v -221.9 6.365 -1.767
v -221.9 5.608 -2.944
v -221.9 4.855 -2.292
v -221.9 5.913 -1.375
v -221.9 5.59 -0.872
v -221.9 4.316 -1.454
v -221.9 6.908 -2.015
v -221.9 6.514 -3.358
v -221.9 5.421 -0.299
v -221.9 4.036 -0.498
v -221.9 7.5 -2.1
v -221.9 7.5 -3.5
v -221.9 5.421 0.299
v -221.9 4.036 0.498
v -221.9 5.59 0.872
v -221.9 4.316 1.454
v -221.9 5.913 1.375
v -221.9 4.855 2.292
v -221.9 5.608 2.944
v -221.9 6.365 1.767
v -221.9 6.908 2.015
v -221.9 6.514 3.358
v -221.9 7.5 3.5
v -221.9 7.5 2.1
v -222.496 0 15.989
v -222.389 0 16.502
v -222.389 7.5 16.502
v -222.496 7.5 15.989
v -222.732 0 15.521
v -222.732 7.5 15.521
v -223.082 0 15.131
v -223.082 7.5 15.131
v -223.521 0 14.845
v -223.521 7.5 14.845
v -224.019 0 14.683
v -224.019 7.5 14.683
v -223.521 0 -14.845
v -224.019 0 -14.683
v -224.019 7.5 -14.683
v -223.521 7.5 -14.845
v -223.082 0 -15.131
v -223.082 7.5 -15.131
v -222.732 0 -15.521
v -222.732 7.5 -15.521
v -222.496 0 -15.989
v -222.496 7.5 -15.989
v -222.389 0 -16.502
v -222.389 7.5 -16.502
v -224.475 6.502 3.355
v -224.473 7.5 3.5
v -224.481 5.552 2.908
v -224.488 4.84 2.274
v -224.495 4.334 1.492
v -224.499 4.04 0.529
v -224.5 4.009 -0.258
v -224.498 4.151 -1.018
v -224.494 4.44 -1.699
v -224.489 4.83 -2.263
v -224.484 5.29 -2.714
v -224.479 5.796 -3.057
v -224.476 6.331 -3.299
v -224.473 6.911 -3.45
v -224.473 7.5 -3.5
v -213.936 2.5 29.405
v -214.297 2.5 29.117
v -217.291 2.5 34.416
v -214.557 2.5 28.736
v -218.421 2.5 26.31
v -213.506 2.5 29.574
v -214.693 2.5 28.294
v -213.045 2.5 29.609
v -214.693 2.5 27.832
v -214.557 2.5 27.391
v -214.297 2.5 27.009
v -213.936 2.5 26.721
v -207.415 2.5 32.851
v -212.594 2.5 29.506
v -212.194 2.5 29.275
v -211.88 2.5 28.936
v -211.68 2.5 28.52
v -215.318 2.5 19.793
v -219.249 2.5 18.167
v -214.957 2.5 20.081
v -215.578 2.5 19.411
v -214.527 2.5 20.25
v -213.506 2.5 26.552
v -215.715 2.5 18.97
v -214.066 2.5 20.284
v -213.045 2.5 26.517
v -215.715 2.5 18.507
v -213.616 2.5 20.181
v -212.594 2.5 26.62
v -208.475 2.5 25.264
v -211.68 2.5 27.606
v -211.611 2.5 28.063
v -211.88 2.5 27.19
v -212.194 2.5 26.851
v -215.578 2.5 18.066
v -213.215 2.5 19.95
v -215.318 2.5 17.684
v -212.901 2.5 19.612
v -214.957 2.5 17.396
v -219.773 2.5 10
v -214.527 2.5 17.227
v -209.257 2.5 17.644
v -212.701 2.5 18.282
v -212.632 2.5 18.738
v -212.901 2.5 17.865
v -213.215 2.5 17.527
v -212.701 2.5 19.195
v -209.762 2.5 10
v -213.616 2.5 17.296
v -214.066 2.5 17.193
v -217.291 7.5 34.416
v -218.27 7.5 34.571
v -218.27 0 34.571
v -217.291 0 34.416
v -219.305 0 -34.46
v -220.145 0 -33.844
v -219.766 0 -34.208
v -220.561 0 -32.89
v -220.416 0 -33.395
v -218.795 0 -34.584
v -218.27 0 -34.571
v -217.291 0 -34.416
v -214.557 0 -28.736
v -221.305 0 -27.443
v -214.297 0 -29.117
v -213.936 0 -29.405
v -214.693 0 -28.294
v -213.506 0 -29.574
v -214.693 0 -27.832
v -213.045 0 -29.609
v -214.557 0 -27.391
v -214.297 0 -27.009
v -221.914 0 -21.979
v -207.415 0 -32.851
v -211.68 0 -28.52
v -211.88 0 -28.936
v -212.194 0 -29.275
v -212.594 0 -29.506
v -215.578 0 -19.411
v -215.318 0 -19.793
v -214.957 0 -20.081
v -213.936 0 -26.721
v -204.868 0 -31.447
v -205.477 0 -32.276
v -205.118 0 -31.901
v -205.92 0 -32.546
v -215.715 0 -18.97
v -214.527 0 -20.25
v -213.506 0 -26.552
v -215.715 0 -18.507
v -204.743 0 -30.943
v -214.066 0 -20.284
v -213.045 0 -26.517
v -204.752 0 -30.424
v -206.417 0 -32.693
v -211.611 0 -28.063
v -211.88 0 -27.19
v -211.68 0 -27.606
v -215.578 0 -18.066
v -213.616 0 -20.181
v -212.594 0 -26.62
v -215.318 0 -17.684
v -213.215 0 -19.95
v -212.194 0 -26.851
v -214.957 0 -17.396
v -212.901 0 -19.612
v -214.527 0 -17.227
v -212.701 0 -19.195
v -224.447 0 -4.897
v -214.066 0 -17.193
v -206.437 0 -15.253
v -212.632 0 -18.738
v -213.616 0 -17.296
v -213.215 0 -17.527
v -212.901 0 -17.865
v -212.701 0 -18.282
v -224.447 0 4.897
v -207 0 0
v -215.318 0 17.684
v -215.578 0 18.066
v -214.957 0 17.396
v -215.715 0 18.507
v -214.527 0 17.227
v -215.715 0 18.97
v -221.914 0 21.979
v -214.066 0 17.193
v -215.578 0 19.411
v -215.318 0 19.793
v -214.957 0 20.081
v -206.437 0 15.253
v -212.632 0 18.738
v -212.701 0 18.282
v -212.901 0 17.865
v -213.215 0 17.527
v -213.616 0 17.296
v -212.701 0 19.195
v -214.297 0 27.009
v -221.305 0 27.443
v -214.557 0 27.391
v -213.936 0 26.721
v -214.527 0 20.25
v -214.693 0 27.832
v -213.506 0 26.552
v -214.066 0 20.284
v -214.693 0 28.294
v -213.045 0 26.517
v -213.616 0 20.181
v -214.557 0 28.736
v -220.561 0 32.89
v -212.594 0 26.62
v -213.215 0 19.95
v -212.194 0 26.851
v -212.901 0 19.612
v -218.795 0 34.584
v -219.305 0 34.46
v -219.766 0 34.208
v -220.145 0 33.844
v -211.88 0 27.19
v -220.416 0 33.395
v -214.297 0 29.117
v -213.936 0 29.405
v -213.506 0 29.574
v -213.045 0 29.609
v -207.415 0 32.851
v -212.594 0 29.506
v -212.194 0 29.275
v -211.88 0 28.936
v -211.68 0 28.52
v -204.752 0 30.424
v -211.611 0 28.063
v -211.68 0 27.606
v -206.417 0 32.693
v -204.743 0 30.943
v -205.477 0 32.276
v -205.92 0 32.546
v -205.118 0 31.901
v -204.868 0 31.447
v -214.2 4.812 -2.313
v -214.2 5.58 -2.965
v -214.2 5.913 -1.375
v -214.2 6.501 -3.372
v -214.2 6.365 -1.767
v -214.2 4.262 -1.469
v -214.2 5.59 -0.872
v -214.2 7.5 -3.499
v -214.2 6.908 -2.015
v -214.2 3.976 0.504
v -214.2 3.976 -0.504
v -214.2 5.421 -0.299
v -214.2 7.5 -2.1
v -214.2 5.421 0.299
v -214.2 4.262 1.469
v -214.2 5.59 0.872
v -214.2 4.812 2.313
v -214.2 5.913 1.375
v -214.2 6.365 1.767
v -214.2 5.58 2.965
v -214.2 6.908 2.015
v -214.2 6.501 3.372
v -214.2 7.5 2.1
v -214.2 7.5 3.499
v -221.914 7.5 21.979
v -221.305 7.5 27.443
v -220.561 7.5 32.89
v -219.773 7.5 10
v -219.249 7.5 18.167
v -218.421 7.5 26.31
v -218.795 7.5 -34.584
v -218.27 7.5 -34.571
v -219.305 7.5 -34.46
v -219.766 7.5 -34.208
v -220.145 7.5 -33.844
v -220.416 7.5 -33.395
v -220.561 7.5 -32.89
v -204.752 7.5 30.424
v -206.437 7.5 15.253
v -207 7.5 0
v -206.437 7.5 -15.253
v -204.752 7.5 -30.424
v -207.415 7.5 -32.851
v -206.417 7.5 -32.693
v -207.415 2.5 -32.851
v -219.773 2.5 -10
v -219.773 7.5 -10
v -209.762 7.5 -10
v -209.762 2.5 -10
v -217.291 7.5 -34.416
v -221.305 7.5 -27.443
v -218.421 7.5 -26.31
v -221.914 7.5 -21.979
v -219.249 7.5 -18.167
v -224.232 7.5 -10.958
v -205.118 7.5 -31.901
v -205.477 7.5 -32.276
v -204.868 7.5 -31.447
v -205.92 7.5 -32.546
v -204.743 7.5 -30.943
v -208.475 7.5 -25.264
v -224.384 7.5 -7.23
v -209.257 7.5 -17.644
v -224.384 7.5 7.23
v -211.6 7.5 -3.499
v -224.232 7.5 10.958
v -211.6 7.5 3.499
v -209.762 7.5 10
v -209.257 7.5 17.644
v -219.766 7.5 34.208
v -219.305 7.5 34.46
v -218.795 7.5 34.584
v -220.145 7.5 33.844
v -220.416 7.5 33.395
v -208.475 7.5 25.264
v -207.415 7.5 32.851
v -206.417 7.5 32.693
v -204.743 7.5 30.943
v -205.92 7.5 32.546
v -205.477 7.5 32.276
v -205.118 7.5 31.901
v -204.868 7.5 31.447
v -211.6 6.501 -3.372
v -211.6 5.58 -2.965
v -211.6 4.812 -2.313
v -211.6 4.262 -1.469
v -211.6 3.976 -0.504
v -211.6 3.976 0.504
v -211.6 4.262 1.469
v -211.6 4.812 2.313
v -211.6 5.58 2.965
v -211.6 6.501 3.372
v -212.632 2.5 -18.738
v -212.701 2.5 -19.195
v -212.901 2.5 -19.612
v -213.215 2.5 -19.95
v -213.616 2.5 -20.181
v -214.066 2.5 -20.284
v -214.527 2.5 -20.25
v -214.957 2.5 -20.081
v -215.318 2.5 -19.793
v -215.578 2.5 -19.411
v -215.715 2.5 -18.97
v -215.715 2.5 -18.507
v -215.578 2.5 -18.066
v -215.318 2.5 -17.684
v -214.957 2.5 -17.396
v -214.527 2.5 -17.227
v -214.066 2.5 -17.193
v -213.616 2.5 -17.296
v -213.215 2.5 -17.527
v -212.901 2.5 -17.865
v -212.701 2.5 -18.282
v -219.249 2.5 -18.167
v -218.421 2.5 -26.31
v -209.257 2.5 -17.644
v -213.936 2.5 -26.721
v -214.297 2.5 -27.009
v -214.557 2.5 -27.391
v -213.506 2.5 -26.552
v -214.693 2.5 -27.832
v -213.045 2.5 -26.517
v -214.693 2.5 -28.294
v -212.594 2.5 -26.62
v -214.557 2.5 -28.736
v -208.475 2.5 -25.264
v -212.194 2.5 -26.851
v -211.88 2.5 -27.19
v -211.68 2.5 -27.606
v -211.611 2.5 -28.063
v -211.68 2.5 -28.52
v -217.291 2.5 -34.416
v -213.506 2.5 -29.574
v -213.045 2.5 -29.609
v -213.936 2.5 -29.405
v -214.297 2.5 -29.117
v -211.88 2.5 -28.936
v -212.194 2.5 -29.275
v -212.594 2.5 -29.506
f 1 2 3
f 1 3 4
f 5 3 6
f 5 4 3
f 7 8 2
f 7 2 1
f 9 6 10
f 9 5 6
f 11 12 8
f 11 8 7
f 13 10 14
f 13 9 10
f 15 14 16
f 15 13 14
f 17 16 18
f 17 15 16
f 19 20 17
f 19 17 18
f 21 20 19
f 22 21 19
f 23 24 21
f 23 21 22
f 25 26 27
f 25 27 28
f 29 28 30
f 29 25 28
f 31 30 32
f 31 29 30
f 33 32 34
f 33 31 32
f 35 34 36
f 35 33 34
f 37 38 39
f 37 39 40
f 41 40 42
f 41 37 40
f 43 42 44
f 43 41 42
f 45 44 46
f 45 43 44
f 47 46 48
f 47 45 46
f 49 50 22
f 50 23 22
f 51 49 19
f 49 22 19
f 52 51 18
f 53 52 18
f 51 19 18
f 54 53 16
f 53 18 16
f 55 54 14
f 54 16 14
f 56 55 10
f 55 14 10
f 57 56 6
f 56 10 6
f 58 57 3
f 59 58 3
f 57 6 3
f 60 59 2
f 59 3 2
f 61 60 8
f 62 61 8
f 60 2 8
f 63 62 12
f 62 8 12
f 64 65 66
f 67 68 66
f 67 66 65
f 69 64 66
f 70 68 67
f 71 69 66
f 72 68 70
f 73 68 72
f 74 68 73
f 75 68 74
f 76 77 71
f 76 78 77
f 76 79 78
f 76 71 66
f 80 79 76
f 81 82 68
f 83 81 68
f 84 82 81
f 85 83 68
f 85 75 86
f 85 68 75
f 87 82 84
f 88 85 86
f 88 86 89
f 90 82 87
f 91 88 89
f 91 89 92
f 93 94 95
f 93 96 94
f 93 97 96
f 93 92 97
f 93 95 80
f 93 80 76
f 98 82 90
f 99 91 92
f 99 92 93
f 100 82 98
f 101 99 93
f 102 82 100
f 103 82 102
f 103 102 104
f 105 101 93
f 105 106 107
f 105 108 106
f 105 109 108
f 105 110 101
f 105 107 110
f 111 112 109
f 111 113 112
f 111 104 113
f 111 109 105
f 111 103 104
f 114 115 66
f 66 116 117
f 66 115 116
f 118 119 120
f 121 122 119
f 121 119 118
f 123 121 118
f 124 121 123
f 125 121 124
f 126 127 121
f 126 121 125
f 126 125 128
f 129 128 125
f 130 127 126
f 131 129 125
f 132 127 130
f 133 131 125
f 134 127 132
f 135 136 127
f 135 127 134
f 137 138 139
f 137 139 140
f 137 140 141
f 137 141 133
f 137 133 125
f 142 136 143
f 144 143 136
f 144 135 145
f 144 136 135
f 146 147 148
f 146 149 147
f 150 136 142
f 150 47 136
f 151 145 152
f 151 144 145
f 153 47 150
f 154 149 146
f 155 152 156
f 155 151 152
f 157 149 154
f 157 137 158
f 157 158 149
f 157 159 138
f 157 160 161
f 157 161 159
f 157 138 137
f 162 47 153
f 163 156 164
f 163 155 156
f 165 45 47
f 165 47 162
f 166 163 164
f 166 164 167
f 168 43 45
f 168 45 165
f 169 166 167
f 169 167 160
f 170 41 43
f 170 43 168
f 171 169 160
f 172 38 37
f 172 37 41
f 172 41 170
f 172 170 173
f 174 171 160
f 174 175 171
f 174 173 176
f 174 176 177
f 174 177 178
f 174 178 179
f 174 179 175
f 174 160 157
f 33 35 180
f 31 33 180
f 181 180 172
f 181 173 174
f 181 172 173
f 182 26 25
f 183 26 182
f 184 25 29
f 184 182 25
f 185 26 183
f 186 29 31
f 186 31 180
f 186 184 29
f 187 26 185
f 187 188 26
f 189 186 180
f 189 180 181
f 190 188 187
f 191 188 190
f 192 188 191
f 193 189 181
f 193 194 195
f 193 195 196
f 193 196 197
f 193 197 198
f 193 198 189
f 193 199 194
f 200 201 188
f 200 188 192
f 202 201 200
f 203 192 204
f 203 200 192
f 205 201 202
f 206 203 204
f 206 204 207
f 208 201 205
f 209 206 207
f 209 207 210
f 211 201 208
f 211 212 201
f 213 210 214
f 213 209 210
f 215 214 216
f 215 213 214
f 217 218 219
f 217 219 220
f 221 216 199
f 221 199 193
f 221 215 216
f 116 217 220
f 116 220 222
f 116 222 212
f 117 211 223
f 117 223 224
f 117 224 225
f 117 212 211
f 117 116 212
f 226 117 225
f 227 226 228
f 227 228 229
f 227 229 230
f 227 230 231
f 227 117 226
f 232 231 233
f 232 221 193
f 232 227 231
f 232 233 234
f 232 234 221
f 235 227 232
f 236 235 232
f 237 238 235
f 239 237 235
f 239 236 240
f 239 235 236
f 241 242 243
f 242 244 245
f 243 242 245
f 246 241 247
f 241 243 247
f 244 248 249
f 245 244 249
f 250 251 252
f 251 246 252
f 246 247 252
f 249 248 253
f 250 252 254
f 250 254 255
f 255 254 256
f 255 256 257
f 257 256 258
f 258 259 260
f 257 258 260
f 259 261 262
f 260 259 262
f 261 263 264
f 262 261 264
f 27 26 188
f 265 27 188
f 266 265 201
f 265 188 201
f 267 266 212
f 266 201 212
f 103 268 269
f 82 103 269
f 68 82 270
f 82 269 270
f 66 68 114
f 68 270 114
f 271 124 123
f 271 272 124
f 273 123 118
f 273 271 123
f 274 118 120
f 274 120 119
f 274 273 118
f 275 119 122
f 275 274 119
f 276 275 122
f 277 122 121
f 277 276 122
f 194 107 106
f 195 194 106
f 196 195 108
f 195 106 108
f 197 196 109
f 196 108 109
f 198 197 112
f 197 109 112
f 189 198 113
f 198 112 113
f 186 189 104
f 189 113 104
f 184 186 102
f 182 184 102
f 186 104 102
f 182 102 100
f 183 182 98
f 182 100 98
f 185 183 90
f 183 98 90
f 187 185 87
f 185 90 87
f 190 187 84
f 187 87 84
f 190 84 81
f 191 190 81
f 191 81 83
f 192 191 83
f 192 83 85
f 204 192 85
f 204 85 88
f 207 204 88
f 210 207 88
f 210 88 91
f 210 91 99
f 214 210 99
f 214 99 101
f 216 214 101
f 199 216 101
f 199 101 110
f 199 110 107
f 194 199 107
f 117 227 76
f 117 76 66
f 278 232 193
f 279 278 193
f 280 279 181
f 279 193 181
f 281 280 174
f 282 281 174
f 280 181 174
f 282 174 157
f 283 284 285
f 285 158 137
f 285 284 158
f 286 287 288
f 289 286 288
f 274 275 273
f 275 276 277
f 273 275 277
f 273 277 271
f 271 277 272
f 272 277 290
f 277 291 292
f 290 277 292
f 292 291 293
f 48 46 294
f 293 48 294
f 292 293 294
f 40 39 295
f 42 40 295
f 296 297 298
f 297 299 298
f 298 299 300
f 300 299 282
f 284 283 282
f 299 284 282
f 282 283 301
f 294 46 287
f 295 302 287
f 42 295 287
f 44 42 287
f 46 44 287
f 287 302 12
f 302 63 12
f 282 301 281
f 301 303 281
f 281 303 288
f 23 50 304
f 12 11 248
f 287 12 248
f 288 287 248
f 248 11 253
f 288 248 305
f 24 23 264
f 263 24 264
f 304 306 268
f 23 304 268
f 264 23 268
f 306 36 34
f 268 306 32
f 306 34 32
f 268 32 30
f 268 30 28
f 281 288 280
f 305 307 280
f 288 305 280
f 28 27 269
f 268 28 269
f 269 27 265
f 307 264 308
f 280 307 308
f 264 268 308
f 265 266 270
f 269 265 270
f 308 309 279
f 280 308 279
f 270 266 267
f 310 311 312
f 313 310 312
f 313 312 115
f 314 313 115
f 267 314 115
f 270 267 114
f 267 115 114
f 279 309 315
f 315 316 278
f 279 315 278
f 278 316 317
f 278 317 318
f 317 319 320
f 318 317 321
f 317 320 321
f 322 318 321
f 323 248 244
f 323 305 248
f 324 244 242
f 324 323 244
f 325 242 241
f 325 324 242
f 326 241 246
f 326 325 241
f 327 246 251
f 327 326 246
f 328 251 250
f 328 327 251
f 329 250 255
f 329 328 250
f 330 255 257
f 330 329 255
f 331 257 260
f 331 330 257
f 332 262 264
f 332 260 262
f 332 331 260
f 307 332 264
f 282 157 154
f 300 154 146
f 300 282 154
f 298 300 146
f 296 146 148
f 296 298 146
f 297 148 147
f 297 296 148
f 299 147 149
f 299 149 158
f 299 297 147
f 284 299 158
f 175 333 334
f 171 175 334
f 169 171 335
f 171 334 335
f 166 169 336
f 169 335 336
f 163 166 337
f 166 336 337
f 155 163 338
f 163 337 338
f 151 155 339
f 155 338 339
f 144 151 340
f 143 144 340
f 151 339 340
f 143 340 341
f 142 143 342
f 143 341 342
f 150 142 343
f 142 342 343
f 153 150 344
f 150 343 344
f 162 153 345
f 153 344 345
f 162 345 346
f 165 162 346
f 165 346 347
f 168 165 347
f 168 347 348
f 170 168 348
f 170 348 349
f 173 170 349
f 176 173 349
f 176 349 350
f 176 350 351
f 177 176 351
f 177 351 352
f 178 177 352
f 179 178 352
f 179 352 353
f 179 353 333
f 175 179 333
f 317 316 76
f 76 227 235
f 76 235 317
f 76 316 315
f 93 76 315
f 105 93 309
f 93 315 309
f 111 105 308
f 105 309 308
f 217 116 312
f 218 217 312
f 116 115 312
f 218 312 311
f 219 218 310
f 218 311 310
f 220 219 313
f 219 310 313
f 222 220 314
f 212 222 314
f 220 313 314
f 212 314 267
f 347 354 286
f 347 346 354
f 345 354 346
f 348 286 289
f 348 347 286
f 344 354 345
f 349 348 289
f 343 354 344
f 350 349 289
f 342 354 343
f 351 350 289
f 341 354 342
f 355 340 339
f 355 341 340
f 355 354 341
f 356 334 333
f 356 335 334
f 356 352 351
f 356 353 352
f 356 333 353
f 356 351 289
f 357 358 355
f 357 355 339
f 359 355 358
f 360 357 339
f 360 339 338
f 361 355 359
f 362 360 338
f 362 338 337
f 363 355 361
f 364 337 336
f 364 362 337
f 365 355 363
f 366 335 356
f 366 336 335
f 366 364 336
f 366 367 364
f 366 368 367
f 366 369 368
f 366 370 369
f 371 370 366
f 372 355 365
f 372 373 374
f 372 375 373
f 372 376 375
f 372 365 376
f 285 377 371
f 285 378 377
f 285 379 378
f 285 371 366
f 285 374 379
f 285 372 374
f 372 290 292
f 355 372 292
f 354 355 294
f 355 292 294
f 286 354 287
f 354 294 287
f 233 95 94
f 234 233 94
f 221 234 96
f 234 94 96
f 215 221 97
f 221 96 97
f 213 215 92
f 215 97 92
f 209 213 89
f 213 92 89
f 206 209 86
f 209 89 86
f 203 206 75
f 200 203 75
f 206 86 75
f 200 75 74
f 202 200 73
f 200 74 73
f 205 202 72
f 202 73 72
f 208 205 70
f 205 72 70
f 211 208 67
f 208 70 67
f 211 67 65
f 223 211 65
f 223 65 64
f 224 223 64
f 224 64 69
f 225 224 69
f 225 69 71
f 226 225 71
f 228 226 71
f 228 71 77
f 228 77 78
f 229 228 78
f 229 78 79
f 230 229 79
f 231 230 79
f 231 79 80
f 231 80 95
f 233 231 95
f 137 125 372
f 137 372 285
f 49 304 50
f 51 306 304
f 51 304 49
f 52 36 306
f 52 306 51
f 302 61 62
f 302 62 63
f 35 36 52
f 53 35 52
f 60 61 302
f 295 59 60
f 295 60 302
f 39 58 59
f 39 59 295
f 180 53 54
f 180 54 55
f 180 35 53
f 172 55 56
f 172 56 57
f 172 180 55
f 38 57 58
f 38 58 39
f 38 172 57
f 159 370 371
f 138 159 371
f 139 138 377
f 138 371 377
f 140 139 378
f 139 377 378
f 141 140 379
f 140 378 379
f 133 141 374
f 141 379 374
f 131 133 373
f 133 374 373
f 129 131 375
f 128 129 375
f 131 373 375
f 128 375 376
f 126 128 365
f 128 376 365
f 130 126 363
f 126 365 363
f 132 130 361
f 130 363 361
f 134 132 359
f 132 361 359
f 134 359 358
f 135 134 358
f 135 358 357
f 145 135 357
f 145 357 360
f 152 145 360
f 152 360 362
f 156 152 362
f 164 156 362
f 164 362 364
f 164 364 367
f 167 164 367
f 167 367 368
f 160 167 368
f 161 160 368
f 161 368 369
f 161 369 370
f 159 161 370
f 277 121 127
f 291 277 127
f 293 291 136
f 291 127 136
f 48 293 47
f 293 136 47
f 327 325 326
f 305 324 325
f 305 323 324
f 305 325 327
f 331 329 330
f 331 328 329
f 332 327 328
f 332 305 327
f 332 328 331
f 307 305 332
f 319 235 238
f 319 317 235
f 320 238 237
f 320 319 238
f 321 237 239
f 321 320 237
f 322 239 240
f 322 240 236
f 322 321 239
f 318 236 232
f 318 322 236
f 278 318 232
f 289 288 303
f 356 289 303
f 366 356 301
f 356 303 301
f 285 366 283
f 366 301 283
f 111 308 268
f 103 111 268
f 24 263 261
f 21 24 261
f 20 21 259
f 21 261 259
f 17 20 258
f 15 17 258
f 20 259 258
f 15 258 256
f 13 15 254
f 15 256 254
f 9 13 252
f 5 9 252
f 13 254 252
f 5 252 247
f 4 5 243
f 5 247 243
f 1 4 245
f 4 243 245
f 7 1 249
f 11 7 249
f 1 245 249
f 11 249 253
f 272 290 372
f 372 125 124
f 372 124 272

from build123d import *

# Parameters (mm, degrees)
BOSS_EXTRUDE1_DEPTH            = 7.5
BOSS_EXTRUDE2_DEPTH            = 7.5
CUT_EXTRUDE1_DEPTH             = 5
F_3_1_3_1_DIAMETER_HOLE2_D     = 3.1
FILLET1_R                      = 2
FILLET2_R                      = 2
CUT_EXTRUDE2_REACH             = 39.378
CUT_EXTRUDE2_END_RADIUS        = 224.5
SKETCH22_R                     = 2.1
CUT_EXTRUDE2_DIRECTION_2_DEPTH = 0.9
SKETCH23_R                     = 3.5
CUT_EXTRUDE3_DEPTH             = 2.6
SKETCH24_W                     = 2.6
SKETCH24_H                     = 3.5


with BuildPart() as part:
    # Sketch1 → Boss-Extrude1 (new body)
    with BuildSketch(Plane(origin=(0, 0, 0), x_dir=(1, 0, 0), z_dir=(0, 1, 0))):
        with BuildLine():
            ThreePointArc((-207.414551525, 32.851237658), (-210, 0), (-207.414551525, -32.851237658))
            Line((-207.414551525, -32.851237658), (-217.291434931, -34.415582309))
            ThreePointArc((-217.291434931, -34.415582309), (-220, 0), (-217.291434931, 34.415582309))
            Line((-217.291434931, 34.415582309), (-207.414551525, 32.851237658))
        make_face()
        with BuildLine():
            ThreePointArc((-217.291434931, -34.415582309), (-220, 0), (-217.291434931, 34.415582309))
            Line((-217.291434931, 34.415582309), (-220.254499953, 34.884885704))
            ThreePointArc((-220.254499953, 34.884885704), (-223, 0), (-220.254499953, -34.884885704))
            Line((-220.254499953, -34.884885704), (-217.291434931, -34.415582309))
        make_face()
        with BuildLine():
            Line((-204.451486503, 32.381934263), (-207.414551525, 32.851237658))
            ThreePointArc((-207.414551525, 32.851237658), (-210, 0), (-207.414551525, -32.851237658))
            Line((-207.414551525, -32.851237658), (-204.451486503, -32.381934263))
            ThreePointArc((-204.451486503, -32.381934263), (-207, 0), (-204.451486503, 32.381934263))
        make_face()
    extrude(amount=BOSS_EXTRUDE1_DEPTH)

    # Sketch19 → Boss-Extrude2 (add)
    with BuildSketch(Plane(origin=(0, 0, 0), x_dir=(1, 0, 0), z_dir=(0, 1, 0))):
        with BuildLine():
            Line((-224.019328267, 14.683002512), (-222.522539882, 14.584897818))
            ThreePointArc((-222.522539882, 14.584897818), (-223, 0), (-222.522539882, -14.584897818))
            Line((-222.522539882, -14.584897818), (-224.019328267, -14.683002512))
            ThreePointArc((-224.019328267, -14.683002512), (-224.5, 0), (-224.019328267, 14.683002512))
        make_face()
    extrude(amount=BOSS_EXTRUDE2_DEPTH)

    # Sketch15 → Cut-Extrude1 (cut)
    with BuildSketch(Plane(origin=(0, 7.5, 0), x_dir=(1, 0, 0), z_dir=(0, 1, 0))):
        with BuildLine():
            Line((-219.772609758, 10), (-209.761769634, 10))
            ThreePointArc((-209.761769634, 10), (-208.900850883, 21.457737542), (-207.414551525, 32.851237658))
            Line((-207.414551525, 32.851237658), (-217.291434931, 34.415582309))
            ThreePointArc((-217.291434931, 34.415582309), (-218.872736893, 22.242415451), (-219.772609758, 10))
        make_face()
        with BuildLine():
            ThreePointArc((-207.414551525, -32.851237658), (-208.900850883, -21.457737542), (-209.761769634, -10))
            Line((-209.761769634, -10), (-219.772609758, -10))
            ThreePointArc((-219.772609758, -10), (-218.872736893, -22.242415451), (-217.291434931, -34.415582309))
            Line((-217.291434931, -34.415582309), (-207.414551525, -32.851237658))
        make_face()
    extrude(amount=-CUT_EXTRUDE1_DEPTH, mode=Mode.SUBTRACT)

    # Ø3.1 (3.1) Diameter Hole2 (through all)
    with Locations(Plane(origin=(0, 0, 0), x_dir=(-1, 0, 0), z_dir=(0, -1, 0))):
        with Locations((213.160645195, -28.063131327), (214.18186009, -18.738484691), (214.18186009, 18.738484691), (213.160645195, 28.063131327)):
            Hole(F_3_1_3_1_DIAMETER_HOLE2_D / 2)

    # Fillet1
    fillet1_edges = [part.edges().sort_by_distance(p)[0] for p in [
        (-220.254499953, 3.75, 34.884885704),
        (-220.254499953, 3.75, -34.884885704),
        (-204.451486503, 3.75, -32.381934263),
        (-204.451486503, 3.75, 32.381934263),
    ]]
    fillet(fillet1_edges, radius=FILLET1_R)

    # Fillet2
    # the kernel refuses this fillet: 2 mm, written as the material it adds along each edge
    with BuildSketch(Plane(origin=(-222.522539882, 0, -14.584897818), x_dir=(0.06970140258603677, 0, -0.9975678996827931), z_dir=(0, 1, 0))) as fillet2_piece_1:
        with BuildLine():
            CenterArc((1.930030715, 1.99998144), FILLET2_R, 194.477374901, 75.275788142)
            Line((-0.006462156, 1.49998608), (-0.045192014, 1.489986173))
            ThreePointArc((-0.045192014, 1.489986173), (-0.043230707, 0.749820716), (-0.039999629, -0.000172324))
            Line((-0.039999629, -0.000172324), (0.000172324, -0.039999629))
            ThreePointArc((0.000172324, -0.039999629), (0.960707253, -0.037930577), (1.921242182, -0.039999629))
            Line((1.921242182, -0.039999629), (1.921414506, 0))
        make_face()
    extrude(amount=7.5)
    with BuildSketch(Plane(origin=(-222.522539882, 0, 14.584897818), x_dir=(-0.9978589232386029, 0, 0.06540312923015226), z_dir=(0, 1, 0))) as fillet2_piece_2:
        with BuildLine():
            CenterArc((1.991648107, 1.938628933), FILLET2_R, 180.493673912, 75.275788142)
            Line((-0.008277654, 1.921396676), (-0.048276169, 1.92105203))
            ThreePointArc((-0.048276169, 1.92105203), (-0.042069052, 0.960534929), (-0.04, 0))
            Line((-0.04, 0), (0, -0.04))
            ThreePointArc((0, -0.04), (0.75, -0.04), (1.490167038, -0.038772579))
            Line((1.490167038, -0.038772579), (1.5, 0))
        make_face()
    extrude(amount=7.5)

    # Cut-Extrude2: up to this cylinder (the profile starts inside it)
    cut_extrude2_end = Plane(origin=(0, 7.5, 0), z_dir=(0, -1, 0)) * Cylinder(CUT_EXTRUDE2_END_RADIUS, 528.756, mode=Mode.PRIVATE)
    # Sketch22 → Cut-Extrude2 (cut, up to the surface)
    with BuildSketch(Plane(origin=(-212.5, 0, 0), x_dir=(0, 0, -1), z_dir=(1, 0, 0)), mode=Mode.PRIVATE) as cut_extrude2_sk1:
        with Locations((0, 7.5)):
            Circle(SKETCH22_R)
    cut_extrude2_tool1 = extrude(cut_extrude2_sk1.sketch, amount=-CUT_EXTRUDE2_REACH, mode=Mode.PRIVATE) & cut_extrude2_end
    add(cut_extrude2_tool1.solids().sort_by_distance((-212.5, 7.5, 0))[0], mode=Mode.SUBTRACT)

    # Sketch22 → Cut-Extrude2 direction 2 (cut)
    with BuildSketch(Plane(origin=(-212.5, 0, 0), x_dir=(0, 0, -1), z_dir=(1, 0, 0))):
        with Locations((0, 7.5)):
            Circle(SKETCH22_R)
    extrude(amount=CUT_EXTRUDE2_DIRECTION_2_DEPTH, mode=Mode.SUBTRACT)

    # Sketch23 → Cut-Extrude3 (cut)
    with BuildSketch(Plane.ZY.offset(211.6)):
        with Locations((0, 7.439199918)):
            Circle(SKETCH23_R)
    extrude(amount=CUT_EXTRUDE3_DEPTH, mode=Mode.SUBTRACT)

    # Sketch24 → Cut-Revolve1 (revolve, cut)
    with BuildSketch(Plane(origin=(0, 7.5, 0), x_dir=(1, 0, 0), z_dir=(0, 1, 0))):
        with Locations((-223.2, 1.75)):
            Rectangle(SKETCH24_W, SKETCH24_H)
    revolve(axis=Axis((-224.5, 7.5, 0), (1, 0, 0)), mode=Mode.SUBTRACT)


solid = part.part
